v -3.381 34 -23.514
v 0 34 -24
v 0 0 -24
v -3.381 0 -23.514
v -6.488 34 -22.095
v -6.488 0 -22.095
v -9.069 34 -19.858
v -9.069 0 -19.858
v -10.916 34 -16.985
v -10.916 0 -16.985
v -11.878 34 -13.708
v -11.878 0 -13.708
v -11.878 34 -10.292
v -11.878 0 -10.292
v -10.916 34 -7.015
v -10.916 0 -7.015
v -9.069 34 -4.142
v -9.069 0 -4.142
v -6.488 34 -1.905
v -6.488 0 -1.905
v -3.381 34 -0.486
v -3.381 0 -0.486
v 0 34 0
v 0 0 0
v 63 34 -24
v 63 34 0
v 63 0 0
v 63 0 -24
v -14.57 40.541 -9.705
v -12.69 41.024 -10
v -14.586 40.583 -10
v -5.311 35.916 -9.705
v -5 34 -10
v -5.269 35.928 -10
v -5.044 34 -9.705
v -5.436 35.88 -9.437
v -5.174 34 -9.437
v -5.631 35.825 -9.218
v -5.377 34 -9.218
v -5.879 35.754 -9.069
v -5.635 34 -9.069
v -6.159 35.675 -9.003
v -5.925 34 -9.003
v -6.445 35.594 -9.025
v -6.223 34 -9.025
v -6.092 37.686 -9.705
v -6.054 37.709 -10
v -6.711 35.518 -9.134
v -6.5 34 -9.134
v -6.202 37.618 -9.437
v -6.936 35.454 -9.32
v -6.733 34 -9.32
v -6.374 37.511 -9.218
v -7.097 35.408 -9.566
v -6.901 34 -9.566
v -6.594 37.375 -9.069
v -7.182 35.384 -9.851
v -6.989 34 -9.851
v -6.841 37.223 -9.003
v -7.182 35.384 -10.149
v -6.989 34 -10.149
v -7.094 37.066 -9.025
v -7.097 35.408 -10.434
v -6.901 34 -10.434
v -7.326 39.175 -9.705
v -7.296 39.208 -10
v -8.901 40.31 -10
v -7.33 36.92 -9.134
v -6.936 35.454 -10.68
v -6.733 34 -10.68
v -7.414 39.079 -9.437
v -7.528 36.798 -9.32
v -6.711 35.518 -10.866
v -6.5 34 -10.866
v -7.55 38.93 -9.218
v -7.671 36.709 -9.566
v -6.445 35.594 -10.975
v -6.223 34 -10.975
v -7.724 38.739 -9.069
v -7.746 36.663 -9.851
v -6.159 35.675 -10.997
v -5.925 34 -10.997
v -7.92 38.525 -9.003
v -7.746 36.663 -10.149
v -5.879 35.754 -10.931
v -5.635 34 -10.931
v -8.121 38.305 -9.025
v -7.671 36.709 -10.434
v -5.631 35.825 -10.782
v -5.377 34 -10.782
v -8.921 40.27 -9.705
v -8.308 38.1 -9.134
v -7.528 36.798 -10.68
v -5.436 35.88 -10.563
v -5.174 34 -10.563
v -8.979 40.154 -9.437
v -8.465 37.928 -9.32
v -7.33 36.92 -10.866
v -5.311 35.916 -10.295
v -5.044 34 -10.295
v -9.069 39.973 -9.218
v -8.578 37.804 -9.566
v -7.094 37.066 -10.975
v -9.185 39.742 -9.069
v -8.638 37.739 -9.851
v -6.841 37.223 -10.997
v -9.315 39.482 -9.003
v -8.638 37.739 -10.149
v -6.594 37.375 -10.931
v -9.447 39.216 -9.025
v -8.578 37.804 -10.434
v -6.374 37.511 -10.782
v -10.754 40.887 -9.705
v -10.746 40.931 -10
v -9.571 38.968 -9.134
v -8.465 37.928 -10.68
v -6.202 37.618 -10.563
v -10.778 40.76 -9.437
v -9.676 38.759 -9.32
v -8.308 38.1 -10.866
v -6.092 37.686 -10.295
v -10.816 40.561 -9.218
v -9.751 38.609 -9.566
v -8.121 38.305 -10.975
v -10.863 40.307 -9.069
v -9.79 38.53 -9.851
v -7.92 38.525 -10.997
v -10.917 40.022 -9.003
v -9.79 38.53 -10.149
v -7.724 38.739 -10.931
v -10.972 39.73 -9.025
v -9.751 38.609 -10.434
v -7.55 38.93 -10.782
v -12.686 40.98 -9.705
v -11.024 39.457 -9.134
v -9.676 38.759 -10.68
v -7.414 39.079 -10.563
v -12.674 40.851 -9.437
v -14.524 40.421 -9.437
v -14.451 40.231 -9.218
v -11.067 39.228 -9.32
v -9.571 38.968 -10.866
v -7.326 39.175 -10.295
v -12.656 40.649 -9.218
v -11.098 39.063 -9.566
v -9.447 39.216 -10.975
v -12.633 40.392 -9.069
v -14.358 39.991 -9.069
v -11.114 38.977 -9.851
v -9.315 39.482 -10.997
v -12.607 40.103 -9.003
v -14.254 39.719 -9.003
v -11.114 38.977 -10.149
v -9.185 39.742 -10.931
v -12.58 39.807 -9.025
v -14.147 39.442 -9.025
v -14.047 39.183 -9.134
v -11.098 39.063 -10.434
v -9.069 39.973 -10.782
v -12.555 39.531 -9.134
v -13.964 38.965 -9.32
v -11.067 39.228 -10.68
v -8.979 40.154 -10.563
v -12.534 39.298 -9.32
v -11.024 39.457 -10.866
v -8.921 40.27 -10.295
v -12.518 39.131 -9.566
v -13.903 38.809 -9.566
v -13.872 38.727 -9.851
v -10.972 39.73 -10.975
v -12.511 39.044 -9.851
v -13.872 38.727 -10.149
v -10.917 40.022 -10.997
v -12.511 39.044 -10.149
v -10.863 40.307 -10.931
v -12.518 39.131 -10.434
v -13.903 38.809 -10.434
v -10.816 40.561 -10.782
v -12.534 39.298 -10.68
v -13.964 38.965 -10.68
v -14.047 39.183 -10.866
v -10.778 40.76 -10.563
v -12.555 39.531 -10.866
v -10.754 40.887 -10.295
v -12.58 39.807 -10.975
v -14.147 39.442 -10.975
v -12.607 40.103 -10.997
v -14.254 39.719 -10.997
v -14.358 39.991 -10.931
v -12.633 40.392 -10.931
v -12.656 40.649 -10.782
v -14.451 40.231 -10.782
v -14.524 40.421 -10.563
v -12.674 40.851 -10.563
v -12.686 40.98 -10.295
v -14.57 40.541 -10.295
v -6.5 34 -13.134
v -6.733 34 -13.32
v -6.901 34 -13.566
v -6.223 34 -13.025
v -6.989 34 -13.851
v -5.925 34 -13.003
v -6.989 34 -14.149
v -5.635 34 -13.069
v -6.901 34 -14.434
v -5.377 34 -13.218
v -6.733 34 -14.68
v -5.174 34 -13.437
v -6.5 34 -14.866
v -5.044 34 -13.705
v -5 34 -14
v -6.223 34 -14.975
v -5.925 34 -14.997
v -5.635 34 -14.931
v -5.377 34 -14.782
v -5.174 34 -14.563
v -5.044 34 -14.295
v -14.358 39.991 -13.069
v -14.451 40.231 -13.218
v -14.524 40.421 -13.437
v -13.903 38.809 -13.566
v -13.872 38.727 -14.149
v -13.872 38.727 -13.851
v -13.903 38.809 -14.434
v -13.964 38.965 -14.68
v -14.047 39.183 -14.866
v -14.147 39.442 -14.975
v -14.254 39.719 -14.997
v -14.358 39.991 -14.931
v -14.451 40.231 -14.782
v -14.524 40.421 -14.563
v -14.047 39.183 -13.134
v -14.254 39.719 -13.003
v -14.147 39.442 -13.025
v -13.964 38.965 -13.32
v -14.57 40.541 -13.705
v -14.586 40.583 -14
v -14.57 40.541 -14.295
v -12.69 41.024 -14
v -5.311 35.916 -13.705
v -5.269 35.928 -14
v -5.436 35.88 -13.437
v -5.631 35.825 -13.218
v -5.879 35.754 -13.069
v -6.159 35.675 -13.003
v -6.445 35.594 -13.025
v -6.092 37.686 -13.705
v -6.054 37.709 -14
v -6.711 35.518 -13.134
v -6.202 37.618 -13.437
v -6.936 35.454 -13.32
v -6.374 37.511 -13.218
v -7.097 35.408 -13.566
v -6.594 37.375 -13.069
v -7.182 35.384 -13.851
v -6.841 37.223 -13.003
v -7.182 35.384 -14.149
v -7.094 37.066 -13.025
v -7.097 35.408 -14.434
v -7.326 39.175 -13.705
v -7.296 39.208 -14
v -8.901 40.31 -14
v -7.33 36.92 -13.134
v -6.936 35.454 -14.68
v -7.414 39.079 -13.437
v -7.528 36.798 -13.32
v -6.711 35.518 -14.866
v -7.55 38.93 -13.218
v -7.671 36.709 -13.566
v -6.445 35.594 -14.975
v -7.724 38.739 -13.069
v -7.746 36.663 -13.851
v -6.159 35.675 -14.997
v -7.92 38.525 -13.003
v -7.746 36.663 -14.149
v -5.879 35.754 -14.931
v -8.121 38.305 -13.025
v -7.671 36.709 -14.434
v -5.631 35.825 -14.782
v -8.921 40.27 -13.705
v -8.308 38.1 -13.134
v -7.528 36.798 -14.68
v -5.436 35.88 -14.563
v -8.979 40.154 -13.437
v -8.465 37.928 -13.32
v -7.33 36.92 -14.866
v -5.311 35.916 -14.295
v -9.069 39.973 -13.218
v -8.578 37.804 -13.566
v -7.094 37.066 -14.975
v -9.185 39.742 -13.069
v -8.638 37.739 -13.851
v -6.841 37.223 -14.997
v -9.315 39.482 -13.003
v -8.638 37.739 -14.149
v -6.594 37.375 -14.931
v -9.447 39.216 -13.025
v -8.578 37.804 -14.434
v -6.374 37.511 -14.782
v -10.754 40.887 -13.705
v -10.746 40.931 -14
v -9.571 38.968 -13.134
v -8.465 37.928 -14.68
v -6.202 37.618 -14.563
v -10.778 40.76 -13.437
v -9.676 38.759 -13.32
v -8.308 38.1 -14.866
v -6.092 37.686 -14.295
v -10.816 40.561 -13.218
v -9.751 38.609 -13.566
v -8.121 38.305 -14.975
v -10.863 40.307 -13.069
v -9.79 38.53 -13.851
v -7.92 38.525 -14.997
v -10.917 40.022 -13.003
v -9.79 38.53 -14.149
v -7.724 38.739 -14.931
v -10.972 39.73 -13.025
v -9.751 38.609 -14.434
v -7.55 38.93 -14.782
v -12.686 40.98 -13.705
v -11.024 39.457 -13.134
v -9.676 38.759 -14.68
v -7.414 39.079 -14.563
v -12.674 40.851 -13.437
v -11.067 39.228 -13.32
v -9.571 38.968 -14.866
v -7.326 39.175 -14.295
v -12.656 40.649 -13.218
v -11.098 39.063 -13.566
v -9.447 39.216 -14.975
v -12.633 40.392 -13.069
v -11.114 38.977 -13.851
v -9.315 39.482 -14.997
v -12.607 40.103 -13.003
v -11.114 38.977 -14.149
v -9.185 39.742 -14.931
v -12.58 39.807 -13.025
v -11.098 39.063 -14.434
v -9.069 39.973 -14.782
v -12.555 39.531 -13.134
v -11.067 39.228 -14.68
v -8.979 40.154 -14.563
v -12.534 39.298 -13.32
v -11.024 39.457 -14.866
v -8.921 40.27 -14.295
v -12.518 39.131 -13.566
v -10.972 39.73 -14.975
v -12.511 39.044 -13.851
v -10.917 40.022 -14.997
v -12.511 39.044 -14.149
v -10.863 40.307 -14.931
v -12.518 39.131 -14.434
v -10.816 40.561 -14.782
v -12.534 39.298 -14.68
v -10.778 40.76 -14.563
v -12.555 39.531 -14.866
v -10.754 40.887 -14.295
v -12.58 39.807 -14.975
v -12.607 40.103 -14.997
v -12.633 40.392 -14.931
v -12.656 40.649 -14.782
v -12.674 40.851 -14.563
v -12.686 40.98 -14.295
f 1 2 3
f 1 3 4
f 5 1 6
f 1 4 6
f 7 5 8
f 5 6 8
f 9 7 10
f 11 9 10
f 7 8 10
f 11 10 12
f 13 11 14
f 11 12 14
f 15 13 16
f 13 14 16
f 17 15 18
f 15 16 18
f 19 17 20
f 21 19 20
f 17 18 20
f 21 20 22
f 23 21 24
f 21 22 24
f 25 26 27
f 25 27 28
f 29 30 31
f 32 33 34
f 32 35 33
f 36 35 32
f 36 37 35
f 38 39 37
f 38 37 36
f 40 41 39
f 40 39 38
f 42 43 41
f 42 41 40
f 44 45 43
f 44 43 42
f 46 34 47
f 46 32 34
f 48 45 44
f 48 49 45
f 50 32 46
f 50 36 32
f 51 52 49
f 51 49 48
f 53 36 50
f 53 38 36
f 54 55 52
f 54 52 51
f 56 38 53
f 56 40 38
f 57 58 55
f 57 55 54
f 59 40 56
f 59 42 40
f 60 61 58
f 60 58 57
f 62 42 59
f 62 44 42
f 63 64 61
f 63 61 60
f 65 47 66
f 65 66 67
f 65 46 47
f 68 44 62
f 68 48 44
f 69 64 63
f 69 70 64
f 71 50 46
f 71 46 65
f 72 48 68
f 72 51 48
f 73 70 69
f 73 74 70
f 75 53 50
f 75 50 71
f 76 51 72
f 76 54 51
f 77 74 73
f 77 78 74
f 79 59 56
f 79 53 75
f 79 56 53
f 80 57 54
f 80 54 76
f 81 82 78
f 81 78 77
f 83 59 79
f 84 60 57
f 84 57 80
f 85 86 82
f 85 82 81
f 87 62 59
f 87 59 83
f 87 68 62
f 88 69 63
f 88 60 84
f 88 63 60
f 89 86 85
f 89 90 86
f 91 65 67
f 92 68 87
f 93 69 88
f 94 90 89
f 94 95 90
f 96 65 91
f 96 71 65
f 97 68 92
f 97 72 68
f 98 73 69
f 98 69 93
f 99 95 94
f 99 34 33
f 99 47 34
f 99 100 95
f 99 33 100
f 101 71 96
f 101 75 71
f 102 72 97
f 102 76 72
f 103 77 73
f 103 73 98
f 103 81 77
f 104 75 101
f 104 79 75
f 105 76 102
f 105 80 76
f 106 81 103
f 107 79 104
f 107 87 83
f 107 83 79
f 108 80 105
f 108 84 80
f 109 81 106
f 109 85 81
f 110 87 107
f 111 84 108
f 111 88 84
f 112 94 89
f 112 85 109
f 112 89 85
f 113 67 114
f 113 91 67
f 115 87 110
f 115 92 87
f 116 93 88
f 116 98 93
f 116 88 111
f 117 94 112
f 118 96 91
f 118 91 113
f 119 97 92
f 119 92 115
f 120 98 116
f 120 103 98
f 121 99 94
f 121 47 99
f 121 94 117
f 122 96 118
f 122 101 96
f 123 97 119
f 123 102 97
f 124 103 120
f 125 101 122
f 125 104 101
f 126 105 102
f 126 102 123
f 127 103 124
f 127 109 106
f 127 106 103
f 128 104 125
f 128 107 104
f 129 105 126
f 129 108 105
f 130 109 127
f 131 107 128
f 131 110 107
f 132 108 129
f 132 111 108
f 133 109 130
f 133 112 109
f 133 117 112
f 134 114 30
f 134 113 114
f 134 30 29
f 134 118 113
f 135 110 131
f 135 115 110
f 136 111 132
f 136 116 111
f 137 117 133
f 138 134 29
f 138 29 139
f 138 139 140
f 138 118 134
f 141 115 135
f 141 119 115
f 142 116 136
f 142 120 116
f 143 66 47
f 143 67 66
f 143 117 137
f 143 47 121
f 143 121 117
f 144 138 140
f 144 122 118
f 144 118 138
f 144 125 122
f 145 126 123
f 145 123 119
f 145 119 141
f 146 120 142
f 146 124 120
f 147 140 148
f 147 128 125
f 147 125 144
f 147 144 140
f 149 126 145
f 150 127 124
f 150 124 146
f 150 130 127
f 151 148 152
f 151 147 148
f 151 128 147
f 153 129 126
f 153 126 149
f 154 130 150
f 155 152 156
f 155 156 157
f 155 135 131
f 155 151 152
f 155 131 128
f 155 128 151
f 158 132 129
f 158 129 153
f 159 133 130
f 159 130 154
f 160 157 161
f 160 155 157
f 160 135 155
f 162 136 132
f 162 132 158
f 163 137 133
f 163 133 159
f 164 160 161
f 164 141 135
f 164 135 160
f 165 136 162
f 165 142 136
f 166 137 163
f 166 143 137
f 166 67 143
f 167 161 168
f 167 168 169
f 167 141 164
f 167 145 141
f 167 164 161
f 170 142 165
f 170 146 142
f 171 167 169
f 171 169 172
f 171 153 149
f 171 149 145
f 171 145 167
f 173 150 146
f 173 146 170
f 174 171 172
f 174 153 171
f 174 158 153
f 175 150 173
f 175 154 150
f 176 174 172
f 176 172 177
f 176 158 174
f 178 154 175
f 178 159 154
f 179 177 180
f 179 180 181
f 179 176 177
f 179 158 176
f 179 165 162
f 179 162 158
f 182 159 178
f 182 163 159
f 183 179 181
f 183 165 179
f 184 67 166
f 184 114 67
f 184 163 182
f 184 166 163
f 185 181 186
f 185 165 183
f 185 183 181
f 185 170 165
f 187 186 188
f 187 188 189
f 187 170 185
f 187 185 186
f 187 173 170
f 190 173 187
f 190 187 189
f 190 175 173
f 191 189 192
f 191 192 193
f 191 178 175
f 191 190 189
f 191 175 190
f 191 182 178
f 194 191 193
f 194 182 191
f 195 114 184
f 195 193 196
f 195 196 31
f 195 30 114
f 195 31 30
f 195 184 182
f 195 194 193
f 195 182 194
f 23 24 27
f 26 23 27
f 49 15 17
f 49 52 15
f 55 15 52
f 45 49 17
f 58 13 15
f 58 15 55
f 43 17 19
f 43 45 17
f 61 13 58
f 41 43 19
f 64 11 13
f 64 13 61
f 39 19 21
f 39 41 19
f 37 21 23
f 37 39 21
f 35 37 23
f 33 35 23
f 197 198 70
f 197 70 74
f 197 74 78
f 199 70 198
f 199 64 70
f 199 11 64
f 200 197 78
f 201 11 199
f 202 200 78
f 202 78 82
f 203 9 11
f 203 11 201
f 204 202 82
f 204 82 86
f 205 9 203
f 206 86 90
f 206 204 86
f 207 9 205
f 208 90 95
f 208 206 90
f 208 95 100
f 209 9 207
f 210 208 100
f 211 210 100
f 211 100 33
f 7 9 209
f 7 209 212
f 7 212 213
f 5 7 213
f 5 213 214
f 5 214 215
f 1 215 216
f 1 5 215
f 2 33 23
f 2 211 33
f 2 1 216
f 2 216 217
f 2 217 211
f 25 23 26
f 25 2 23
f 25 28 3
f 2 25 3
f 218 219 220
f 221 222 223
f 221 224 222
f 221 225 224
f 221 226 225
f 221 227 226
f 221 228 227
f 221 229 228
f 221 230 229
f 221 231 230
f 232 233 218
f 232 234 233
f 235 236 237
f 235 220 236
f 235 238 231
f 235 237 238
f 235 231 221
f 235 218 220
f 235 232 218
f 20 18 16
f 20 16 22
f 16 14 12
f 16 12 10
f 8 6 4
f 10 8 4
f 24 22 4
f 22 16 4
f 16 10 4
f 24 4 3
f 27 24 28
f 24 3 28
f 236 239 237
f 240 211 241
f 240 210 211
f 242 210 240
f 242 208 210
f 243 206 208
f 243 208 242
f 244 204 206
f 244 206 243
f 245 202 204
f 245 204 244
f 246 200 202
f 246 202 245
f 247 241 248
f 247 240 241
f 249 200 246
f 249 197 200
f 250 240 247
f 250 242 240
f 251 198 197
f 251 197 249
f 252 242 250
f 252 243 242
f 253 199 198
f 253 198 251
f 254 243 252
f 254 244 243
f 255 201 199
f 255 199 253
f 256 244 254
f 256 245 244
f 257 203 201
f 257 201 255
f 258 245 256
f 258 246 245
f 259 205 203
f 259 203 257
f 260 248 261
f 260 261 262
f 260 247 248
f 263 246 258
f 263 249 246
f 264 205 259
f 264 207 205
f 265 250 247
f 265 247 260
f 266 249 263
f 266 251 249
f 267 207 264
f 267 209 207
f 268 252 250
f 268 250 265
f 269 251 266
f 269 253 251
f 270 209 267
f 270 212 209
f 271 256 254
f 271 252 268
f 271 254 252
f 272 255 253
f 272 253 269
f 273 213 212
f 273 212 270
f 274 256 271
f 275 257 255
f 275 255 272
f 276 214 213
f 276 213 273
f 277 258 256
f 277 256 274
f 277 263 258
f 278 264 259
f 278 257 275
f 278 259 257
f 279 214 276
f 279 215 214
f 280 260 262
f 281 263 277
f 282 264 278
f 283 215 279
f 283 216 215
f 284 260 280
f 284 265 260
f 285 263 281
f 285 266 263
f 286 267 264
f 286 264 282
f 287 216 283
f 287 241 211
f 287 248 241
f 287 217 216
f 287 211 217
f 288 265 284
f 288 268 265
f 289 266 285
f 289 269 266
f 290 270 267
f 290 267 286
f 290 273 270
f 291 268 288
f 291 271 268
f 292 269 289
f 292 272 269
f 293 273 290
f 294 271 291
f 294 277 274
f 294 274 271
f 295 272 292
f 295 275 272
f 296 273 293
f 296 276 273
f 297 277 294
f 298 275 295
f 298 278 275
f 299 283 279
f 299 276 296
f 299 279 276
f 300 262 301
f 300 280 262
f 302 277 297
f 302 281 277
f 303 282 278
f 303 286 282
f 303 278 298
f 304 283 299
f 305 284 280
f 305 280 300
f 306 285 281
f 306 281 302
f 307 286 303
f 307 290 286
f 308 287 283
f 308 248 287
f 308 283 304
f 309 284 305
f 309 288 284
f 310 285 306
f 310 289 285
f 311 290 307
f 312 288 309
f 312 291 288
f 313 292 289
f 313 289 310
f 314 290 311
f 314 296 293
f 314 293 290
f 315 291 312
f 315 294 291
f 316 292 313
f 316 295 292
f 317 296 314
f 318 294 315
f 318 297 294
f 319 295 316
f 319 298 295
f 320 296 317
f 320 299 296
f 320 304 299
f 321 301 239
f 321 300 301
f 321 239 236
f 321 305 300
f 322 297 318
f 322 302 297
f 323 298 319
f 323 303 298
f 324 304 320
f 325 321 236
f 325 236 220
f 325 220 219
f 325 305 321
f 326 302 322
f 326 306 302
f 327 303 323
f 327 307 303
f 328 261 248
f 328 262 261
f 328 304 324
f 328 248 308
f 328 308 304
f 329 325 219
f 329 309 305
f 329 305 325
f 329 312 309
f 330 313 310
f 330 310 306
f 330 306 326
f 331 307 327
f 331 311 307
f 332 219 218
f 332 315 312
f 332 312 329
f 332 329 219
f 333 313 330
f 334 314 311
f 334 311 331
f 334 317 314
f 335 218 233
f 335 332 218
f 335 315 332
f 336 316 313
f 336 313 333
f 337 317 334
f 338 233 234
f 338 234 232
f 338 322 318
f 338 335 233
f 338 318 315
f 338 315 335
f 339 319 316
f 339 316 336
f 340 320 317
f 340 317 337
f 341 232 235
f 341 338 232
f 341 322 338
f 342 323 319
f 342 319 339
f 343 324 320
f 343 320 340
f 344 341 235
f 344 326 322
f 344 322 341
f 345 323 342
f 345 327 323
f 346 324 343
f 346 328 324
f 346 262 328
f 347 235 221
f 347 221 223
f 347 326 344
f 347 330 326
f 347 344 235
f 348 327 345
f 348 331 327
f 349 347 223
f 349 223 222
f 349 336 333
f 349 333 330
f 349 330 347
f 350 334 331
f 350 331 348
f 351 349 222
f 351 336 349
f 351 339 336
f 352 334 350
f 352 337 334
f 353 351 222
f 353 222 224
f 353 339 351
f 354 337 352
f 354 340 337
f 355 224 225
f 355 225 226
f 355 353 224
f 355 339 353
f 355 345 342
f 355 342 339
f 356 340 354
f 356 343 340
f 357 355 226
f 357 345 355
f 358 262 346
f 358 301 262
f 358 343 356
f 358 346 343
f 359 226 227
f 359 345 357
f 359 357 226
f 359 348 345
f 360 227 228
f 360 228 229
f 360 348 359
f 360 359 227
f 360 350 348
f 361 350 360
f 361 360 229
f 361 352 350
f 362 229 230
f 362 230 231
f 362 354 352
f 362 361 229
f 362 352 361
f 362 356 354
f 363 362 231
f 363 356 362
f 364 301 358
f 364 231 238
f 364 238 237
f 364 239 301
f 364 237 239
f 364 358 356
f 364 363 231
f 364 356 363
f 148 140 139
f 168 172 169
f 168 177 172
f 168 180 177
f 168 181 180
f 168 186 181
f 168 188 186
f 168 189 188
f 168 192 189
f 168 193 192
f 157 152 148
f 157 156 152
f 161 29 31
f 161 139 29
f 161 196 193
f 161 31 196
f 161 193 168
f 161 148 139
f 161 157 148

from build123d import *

# Parameters (mm, degrees)
BOSS_EXTRUDE1_DEPTH = 34
SWEEP2_PROFILE_R    = 1
LPATTERN1_COUNT     = 2
LPATTERN1_PITCH     = 4


with BuildPart() as part:
    # Sketch1 → Boss-Extrude1 (new body)
    with BuildSketch(Plane(origin=(0, 0, 0), x_dir=(1, 0, 0), z_dir=(0, 1, 0))):
        with BuildLine():
            Line((0, 0), (63, 0))
            Line((63, 0), (63, 24))
            Line((63, 24), (0, 24))
            ThreePointArc((0, 24), (-12, 12), (0, 0))
        make_face()
    extrude(amount=BOSS_EXTRUDE1_DEPTH)

    # Sweep2: sweep along a path in Sketch21
    with BuildLine(Plane(origin=(0, 0, -14), x_dir=(-1, 0, 0), z_dir=(0, 0, -1))) as sweep2_path:
        ThreePointArc((6, 34), (8.626551961, 38.989949378), (14.22684679, 39.649546094))
    # Sweep2 profile (on start of the path) → Sweep2 (sweep)
    with BuildSketch(Plane(origin=(-6, 34, -14), x_dir=(1, 0, 0), z_dir=(0, 1, 0))):
        Circle(SWEEP2_PROFILE_R)
    sweep2 = sweep(path=sweep2_path.line)

    # LPattern1: Sweep2 ×2
    with Locations(*[(0, 0, i * LPATTERN1_PITCH) for i in range(1, LPATTERN1_COUNT)]):
        add(sweep2)


solid = part.part
